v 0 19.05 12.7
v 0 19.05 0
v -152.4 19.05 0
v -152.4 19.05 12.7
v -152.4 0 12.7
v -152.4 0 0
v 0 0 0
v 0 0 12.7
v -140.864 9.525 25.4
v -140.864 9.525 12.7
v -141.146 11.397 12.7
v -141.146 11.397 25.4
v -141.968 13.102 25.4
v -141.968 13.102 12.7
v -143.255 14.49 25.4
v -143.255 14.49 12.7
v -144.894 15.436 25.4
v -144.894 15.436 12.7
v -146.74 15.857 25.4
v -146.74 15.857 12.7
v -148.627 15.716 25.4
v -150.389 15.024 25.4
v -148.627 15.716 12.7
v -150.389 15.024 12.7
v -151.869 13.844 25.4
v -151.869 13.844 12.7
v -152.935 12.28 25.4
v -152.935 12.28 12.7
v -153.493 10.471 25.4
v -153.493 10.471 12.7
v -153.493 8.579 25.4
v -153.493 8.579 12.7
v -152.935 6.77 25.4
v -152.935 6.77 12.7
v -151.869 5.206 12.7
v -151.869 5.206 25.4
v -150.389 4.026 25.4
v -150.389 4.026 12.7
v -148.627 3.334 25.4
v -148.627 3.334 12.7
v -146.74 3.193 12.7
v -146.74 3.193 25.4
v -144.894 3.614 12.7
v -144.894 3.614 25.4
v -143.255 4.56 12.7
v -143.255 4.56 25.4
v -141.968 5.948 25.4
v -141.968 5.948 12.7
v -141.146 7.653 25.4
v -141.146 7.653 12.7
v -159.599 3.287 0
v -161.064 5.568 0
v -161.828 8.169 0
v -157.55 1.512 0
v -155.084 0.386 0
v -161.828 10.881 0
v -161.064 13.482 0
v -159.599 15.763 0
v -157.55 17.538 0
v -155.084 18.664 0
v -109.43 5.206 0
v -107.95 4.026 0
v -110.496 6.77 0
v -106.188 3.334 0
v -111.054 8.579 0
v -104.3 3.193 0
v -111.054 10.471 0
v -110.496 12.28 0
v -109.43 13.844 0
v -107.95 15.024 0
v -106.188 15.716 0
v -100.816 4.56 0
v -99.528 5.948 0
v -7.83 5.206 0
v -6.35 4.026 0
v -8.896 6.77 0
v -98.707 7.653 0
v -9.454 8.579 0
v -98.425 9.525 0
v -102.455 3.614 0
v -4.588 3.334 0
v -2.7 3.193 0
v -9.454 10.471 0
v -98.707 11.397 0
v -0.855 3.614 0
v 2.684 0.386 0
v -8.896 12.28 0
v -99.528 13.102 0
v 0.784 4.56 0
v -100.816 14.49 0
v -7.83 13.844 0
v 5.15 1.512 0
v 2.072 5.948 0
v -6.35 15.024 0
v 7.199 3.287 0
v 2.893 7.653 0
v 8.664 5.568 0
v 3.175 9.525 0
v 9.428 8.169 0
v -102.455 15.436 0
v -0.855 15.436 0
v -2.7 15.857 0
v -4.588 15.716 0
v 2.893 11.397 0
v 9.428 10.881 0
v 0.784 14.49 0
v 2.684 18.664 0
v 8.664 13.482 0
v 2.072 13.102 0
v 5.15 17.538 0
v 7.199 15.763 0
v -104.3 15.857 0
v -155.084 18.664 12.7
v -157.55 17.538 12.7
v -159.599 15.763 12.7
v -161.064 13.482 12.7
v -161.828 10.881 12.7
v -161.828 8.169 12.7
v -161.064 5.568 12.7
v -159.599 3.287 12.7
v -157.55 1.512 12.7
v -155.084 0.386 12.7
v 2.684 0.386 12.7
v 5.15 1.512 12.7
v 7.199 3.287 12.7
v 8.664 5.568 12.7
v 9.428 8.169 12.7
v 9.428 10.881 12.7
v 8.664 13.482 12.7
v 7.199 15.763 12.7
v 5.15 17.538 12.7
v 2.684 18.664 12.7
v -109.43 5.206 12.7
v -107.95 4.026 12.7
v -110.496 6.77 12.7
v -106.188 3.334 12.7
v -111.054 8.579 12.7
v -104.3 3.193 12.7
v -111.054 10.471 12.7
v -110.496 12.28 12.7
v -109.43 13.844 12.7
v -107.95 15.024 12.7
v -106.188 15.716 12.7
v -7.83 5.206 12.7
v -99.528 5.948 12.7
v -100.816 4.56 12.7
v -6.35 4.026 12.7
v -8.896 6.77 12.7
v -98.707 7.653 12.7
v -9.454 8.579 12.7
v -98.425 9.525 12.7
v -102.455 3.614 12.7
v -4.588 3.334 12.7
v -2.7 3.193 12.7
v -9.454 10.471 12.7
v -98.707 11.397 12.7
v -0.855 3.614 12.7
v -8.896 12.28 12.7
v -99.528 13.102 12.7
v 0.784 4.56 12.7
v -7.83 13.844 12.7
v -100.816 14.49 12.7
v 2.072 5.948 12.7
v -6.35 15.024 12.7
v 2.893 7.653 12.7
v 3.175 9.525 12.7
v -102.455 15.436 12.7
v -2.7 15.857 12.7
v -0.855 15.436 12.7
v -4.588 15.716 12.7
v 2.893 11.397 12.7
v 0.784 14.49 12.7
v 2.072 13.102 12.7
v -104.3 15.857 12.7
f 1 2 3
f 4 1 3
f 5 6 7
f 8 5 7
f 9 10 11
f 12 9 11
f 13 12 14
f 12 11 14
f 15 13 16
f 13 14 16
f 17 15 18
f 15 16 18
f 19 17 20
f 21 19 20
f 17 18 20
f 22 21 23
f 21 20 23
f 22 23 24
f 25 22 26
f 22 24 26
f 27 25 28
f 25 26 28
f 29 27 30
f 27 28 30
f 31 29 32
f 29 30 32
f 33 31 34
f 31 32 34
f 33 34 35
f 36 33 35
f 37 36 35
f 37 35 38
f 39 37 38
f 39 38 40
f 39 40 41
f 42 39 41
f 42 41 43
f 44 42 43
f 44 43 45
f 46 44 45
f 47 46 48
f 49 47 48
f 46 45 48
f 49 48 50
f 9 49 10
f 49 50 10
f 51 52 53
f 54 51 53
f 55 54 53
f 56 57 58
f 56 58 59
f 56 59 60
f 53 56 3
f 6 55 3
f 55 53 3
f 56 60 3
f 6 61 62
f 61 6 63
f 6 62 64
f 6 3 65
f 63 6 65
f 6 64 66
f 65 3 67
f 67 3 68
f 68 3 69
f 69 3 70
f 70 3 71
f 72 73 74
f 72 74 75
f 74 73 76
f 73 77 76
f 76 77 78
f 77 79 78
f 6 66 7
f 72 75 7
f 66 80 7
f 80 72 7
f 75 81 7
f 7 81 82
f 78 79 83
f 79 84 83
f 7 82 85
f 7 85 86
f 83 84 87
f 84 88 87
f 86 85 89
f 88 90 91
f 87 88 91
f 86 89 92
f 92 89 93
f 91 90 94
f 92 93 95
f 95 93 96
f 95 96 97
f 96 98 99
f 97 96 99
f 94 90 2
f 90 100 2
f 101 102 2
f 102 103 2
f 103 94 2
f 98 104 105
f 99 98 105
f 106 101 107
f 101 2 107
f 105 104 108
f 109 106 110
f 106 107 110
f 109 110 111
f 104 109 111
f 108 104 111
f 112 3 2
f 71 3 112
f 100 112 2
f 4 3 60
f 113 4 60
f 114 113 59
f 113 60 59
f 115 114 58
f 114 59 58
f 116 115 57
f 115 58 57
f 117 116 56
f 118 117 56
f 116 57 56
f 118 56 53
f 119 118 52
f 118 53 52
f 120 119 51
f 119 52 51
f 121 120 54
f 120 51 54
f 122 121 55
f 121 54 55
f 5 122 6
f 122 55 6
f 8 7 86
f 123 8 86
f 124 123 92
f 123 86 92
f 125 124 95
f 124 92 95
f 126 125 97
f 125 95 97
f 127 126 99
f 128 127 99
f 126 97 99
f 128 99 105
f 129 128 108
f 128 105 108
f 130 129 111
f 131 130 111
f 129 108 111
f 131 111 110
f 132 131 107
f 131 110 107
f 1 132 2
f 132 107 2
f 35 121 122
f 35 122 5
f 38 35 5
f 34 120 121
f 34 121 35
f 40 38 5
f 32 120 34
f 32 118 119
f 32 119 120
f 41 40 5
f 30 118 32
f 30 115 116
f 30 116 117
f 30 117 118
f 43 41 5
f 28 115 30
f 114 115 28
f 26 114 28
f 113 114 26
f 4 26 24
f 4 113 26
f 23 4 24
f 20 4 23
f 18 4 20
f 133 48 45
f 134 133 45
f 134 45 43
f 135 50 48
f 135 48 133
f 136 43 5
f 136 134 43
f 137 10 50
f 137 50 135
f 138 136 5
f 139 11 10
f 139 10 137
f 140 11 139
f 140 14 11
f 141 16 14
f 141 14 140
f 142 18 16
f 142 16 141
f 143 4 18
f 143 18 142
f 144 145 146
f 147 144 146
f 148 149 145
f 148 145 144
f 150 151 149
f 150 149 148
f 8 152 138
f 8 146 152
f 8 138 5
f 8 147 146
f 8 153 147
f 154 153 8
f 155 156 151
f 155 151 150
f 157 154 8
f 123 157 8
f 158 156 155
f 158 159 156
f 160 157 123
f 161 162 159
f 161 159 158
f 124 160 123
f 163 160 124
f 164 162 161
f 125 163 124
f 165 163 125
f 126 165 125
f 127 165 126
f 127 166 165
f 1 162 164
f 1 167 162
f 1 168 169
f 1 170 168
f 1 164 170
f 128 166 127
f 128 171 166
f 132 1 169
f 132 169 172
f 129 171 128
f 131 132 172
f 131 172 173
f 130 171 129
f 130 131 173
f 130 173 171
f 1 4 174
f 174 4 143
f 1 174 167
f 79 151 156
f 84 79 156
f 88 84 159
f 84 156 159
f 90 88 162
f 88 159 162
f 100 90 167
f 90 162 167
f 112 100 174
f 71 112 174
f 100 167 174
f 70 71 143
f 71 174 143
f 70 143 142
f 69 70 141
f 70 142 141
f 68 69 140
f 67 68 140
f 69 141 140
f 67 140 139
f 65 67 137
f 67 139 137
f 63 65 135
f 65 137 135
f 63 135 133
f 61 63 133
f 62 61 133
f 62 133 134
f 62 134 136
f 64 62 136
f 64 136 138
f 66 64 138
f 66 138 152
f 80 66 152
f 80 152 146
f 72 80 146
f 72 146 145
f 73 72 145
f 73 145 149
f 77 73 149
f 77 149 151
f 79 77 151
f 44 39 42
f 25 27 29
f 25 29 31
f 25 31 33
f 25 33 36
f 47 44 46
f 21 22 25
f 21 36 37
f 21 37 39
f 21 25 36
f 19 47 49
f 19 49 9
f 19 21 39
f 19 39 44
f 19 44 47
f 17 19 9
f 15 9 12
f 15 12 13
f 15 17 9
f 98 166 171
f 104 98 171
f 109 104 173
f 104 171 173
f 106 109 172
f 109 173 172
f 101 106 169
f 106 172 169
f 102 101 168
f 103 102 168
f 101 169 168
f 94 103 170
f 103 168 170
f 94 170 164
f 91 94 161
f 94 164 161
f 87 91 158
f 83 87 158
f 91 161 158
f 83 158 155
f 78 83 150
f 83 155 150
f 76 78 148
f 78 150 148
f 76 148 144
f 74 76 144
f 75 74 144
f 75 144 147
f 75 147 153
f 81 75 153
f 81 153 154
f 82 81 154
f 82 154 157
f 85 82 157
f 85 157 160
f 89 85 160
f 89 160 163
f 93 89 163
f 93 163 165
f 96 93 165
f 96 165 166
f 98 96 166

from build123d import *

# Parameters (mm, degrees)
F1_DEPTH = 12.7
F2_R     = 6.35
F3_DEPTH = 25.4
F4_R     = 6.35
F5_DEPTH = 12.7


with BuildPart() as f1:
    # F0 (on Top) → F1 (new body)
    with BuildSketch(Plane.XY):
        with BuildLine():
            Line((-152.4, 0), (0, 0))
            ThreePointArc((0, 0), (9.525, 9.525), (0, 19.05))
            Line((0, 19.05), (-152.4, 19.05))
            ThreePointArc((-152.4, 19.05), (-161.925, 9.525), (-152.4, 0))
        make_face()
    extrude(amount=F1_DEPTH)

    # F2 (on face) → F3 (cut)
    with BuildSketch(Plane.XY.offset(12.7)):
        with Locations((-104.775, 9.525)):
            Circle(F2_R)
        with Locations((-3.175, 9.525)):
            Circle(F2_R)
    extrude(amount=-F3_DEPTH, mode=Mode.SUBTRACT)

    # F4 (on face) → F5 (join)
    with BuildSketch(Plane.XY.offset(12.7)):
        with Locations((-147.214279, 9.525)):
            Circle(F4_R)
    extrude(amount=F5_DEPTH)


solid = f1.part
